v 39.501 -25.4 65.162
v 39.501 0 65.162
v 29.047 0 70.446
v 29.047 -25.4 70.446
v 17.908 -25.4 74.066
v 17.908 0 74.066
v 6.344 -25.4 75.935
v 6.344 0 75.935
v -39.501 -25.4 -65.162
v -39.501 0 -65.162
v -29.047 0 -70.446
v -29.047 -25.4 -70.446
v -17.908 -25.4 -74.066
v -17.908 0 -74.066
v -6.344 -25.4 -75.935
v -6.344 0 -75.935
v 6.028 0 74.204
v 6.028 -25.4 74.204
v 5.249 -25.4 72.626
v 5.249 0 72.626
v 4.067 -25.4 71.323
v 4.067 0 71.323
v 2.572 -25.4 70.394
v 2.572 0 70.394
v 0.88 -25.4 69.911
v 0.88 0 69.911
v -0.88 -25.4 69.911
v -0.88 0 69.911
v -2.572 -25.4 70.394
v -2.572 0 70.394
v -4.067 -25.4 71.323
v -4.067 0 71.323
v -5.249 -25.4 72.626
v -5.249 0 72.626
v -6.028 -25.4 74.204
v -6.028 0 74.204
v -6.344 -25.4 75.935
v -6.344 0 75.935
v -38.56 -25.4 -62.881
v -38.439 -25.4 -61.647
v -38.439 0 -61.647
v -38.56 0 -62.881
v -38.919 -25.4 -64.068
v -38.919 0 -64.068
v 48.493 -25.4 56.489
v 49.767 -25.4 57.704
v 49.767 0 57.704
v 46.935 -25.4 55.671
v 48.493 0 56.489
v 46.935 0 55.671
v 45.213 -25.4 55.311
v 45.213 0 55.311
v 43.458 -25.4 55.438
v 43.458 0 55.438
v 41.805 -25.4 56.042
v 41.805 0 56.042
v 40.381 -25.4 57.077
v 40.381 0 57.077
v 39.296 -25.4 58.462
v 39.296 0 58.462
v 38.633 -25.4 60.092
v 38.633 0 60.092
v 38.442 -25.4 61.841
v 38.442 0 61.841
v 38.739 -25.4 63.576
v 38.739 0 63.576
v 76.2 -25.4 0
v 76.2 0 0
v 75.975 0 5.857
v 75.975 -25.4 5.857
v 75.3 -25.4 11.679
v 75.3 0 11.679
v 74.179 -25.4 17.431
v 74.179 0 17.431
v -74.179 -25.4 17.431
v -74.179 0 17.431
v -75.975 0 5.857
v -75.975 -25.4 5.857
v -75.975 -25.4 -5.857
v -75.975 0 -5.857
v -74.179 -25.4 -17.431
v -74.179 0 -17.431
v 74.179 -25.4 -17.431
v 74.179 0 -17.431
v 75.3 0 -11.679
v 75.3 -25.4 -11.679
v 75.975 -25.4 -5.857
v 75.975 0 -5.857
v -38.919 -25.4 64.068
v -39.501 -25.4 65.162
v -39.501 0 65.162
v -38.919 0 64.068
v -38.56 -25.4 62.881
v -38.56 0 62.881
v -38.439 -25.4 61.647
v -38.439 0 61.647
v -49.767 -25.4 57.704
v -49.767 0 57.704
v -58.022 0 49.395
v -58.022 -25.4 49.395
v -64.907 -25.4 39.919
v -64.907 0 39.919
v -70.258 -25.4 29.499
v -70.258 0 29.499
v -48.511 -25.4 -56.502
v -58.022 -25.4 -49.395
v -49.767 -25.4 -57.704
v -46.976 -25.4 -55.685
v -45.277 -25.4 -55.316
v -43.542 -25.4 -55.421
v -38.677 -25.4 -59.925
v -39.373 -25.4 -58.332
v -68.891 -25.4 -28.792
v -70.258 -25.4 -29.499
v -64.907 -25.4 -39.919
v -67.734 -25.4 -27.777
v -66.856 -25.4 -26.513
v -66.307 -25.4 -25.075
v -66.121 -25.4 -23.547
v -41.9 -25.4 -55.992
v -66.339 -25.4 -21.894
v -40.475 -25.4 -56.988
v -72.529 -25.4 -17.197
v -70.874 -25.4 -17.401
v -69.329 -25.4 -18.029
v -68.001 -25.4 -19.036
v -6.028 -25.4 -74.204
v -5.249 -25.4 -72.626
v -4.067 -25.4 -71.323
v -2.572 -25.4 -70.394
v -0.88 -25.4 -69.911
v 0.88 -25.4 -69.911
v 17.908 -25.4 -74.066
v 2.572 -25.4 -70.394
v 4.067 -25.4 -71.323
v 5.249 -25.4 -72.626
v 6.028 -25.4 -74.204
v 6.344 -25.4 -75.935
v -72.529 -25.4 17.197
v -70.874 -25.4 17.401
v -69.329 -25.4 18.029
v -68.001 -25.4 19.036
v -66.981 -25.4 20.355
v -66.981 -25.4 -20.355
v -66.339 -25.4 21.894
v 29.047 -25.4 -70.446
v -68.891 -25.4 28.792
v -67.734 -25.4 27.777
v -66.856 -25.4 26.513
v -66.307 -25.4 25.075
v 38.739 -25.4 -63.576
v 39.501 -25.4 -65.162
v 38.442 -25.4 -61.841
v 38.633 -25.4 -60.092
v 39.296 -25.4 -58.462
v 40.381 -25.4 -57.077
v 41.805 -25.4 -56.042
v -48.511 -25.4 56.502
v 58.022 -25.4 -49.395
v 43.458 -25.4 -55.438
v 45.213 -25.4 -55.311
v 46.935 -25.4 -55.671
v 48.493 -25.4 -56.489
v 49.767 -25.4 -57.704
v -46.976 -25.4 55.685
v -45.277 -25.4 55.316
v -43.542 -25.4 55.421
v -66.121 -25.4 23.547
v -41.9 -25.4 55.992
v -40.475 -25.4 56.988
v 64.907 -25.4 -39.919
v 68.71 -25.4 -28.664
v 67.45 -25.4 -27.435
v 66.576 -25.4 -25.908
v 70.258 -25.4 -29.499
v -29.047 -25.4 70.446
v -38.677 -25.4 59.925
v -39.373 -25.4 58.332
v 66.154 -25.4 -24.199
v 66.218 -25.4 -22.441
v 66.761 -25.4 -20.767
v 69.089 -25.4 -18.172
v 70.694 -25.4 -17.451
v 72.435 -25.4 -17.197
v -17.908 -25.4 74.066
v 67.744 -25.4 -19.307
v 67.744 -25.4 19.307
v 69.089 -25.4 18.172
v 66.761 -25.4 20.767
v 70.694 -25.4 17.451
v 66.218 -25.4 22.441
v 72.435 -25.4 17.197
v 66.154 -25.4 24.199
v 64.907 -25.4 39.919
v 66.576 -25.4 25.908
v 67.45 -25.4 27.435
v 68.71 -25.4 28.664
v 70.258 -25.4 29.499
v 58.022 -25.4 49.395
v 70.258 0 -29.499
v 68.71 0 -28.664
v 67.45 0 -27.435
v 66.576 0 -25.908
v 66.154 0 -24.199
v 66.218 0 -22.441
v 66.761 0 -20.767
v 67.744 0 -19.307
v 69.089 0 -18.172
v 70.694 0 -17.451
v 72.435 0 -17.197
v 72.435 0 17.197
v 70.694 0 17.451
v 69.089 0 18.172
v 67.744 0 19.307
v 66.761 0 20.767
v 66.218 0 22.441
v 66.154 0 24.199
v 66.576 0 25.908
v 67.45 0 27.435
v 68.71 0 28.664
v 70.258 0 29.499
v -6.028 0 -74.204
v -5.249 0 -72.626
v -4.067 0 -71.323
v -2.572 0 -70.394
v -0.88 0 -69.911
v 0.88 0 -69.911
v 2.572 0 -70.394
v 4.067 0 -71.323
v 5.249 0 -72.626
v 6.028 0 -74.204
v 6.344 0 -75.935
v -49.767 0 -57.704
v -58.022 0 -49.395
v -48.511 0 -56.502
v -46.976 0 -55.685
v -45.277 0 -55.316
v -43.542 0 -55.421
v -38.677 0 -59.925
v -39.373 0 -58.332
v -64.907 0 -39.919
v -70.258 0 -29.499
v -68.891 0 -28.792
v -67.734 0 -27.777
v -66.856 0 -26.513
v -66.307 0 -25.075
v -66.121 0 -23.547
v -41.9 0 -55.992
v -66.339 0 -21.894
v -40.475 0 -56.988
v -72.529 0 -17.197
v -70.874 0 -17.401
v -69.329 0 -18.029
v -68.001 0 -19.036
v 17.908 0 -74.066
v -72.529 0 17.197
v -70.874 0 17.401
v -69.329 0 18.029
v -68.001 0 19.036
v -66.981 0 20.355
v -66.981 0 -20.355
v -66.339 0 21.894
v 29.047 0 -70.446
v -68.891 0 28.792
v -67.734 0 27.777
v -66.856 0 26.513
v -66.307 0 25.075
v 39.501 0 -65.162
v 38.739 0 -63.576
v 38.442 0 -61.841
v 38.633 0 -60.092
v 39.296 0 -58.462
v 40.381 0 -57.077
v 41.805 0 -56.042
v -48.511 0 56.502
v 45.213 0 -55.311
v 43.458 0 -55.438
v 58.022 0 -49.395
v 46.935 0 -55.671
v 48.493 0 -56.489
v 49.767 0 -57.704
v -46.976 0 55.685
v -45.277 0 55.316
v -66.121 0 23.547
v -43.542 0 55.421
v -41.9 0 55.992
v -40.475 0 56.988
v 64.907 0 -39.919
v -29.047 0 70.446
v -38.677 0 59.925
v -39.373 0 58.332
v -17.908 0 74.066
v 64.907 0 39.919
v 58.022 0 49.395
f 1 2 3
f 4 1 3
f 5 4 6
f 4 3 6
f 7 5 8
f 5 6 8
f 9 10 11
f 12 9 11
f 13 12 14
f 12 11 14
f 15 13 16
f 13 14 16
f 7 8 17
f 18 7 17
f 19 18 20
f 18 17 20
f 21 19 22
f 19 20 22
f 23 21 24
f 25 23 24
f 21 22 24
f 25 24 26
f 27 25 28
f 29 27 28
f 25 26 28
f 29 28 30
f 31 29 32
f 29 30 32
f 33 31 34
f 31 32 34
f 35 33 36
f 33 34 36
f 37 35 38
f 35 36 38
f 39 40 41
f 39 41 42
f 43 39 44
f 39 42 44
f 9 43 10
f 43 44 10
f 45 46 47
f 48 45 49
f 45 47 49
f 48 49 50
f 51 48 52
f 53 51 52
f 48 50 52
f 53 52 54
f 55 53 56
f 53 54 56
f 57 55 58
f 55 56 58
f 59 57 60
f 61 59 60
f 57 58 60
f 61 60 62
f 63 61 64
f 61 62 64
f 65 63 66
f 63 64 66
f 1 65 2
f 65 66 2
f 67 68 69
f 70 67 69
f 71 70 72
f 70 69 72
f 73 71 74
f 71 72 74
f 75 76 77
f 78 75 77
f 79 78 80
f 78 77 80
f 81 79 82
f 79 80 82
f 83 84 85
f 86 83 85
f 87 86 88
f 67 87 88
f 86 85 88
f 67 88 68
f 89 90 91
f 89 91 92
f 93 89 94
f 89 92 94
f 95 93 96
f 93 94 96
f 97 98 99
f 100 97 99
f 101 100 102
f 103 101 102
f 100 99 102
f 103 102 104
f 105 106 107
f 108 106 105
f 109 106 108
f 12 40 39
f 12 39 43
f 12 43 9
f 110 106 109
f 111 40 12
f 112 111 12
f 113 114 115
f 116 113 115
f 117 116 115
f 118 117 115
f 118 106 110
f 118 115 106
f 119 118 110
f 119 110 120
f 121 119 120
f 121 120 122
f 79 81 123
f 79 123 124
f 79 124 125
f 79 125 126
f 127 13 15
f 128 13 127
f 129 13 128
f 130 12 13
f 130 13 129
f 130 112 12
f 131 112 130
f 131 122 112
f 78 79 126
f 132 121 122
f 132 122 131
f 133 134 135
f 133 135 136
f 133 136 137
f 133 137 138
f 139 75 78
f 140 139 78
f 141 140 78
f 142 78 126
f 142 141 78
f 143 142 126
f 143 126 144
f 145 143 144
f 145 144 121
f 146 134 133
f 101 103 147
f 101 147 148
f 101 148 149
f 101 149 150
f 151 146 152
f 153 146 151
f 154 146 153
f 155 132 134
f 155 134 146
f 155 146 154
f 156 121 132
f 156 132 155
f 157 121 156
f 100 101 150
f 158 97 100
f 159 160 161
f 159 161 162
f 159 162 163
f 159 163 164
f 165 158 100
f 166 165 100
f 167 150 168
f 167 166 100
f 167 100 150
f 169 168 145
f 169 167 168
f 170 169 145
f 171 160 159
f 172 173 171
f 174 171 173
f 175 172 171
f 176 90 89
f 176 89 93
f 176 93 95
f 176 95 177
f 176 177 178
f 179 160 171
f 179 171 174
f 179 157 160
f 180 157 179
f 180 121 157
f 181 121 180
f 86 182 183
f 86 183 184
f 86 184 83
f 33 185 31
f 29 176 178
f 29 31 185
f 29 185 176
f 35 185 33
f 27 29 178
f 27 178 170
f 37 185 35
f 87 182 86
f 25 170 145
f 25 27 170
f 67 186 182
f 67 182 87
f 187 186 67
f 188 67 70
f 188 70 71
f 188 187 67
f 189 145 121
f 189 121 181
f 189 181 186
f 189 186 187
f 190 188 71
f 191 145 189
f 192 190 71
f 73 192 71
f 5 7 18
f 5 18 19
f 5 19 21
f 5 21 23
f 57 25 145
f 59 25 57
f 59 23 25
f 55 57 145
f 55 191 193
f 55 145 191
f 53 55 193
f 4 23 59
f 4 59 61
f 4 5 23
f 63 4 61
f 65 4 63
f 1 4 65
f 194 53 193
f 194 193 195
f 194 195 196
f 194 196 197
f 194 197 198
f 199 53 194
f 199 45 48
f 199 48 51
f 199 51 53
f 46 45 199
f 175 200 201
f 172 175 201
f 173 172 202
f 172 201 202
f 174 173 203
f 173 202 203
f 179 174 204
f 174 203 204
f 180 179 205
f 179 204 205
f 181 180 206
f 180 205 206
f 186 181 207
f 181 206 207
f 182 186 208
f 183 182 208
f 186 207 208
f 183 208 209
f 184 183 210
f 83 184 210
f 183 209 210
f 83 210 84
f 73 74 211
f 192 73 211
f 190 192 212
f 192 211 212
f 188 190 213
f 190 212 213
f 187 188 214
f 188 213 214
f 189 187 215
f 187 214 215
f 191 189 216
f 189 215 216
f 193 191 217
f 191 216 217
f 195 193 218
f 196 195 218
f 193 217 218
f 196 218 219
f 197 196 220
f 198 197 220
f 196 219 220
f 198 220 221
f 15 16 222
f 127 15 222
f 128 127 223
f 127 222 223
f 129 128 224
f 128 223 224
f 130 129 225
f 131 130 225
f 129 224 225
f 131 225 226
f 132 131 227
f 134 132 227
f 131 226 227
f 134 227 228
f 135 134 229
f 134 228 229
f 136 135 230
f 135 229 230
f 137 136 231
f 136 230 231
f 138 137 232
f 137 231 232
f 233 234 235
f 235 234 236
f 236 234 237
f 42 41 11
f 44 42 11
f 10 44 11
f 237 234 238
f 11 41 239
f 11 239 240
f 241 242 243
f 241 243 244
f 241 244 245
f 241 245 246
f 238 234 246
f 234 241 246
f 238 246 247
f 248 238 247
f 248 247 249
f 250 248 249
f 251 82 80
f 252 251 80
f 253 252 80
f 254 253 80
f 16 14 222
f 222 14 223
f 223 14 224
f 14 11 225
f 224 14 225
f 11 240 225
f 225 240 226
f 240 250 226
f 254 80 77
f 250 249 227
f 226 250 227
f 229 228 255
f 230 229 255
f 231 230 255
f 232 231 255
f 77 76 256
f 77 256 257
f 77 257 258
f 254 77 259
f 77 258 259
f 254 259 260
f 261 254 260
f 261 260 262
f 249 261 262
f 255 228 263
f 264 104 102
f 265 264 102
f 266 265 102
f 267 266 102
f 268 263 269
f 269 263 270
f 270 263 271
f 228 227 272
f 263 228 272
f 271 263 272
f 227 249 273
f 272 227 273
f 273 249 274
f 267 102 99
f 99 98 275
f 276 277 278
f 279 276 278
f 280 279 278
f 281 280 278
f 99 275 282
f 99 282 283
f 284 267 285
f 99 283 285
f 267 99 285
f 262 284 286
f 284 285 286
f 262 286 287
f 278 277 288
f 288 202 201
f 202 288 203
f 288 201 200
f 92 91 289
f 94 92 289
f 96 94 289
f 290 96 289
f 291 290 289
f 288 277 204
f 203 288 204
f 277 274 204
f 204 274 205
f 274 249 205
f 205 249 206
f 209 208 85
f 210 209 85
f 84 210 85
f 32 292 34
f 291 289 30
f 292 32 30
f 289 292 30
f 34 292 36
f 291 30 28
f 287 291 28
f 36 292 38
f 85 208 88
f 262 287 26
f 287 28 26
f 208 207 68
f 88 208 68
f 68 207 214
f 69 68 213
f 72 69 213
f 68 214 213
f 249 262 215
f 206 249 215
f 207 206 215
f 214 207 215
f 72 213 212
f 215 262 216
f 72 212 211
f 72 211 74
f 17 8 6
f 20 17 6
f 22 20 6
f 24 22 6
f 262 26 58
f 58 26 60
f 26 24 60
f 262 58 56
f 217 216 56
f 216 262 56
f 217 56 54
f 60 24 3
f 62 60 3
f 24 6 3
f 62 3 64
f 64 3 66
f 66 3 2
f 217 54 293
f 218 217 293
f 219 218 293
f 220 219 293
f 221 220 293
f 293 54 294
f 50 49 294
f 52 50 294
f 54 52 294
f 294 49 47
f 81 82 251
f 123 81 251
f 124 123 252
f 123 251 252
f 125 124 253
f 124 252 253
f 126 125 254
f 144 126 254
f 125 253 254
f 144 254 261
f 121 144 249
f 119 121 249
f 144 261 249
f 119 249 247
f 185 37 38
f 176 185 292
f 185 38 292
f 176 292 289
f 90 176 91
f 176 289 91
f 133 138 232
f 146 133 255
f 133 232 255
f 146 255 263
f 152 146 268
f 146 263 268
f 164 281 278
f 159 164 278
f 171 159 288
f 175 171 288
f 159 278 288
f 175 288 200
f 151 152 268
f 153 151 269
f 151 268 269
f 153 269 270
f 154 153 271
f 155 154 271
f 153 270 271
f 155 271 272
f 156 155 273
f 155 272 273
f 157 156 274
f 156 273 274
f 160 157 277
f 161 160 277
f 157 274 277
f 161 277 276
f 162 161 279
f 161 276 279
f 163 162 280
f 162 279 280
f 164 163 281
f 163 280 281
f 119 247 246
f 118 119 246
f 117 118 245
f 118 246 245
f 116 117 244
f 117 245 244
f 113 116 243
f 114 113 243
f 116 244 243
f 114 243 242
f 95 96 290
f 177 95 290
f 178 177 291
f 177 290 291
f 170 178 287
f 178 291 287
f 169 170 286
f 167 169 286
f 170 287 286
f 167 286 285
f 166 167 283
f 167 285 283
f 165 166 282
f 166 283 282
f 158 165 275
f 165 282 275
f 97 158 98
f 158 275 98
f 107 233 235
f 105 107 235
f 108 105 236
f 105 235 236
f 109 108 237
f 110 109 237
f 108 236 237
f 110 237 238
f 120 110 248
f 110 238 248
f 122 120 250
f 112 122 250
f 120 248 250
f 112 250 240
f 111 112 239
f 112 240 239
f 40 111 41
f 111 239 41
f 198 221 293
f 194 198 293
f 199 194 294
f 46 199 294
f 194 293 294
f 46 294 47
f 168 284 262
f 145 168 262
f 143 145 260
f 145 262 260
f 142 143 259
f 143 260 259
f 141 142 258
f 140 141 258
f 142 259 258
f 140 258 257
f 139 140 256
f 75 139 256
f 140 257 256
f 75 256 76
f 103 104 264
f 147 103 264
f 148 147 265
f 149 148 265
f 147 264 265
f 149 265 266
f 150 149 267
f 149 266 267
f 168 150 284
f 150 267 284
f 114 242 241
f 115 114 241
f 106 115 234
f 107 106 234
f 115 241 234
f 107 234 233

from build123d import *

# Parameters (mm, degrees)
F1_DEPTH = 25.4


with BuildPart() as f1:
    # F0 (on Front) → F1 (new body)
    with BuildSketch(Plane.XZ):
        with BuildLine():
            ThreePointArc((74.179427, -17.43137), (75.693171, -8.774044), (76.2, 0))
            ThreePointArc((76.2, 0), (75.693171, 8.774044), (74.179427, 17.43137))
            ThreePointArc((74.179427, 17.43137), (66.431298, 21.584837), (70.258319, 29.499298))
            ThreePointArc((70.258319, 29.499298), (61.647095, 44.789236), (49.766515, 57.703848))
            ThreePointArc((49.766515, 57.703848), (41.0568, 56.509837), (39.500921, 65.162238))
            ThreePointArc((39.500921, 65.162238), (23.547095, 72.470507), (6.344485, 75.935417))
            ThreePointArc((6.344485, 75.935417), (0, 69.85), (-6.344485, 75.935417))
            ThreePointArc((-6.344485, 75.935417), (-23.547095, 72.470507), (-39.500921, 65.162238))
            ThreePointArc((-39.500921, 65.162238), (-38.710449, 63.483083), (-38.439236, 61.647095))
            ThreePointArc((-38.439236, 61.647095), (-42.70156, 55.650087), (-49.766515, 57.703848))
            ThreePointArc((-49.766515, 57.703848), (-61.647095, 44.789236), (-70.258319, 29.499298))
            ThreePointArc((-70.258319, 29.499298), (-67.256588, 27.171671), (-66.120507, 23.547095))
            ThreePointArc((-66.120507, 23.547095), (-68.631831, 18.488728), (-74.179427, 17.43137))
            ThreePointArc((-74.179427, 17.43137), (-76.2, 0), (-74.179427, -17.43137))
            ThreePointArc((-74.179427, -17.43137), (-68.631831, -18.488728), (-66.120507, -23.547095))
            ThreePointArc((-66.120507, -23.547095), (-67.256588, -27.171671), (-70.258319, -29.499298))
            ThreePointArc((-70.258319, -29.499298), (-61.647095, -44.789236), (-49.766515, -57.703848))
            ThreePointArc((-49.766515, -57.703848), (-42.70156, -55.650087), (-38.439236, -61.647095))
            ThreePointArc((-38.439236, -61.647095), (-38.710449, -63.483083), (-39.500921, -65.162238))
            ThreePointArc((-39.500921, -65.162238), (-23.547095, -72.470507), (-6.344485, -75.935417))
            ThreePointArc((-6.344485, -75.935417), (0, -69.85), (6.344485, -75.935417))
            ThreePointArc((6.344485, -75.935417), (23.547095, -72.470507), (39.500921, -65.162238))
            ThreePointArc((39.500921, -65.162238), (41.0568, -56.509837), (49.766515, -57.703848))
            ThreePointArc((49.766515, -57.703848), (61.647095, -44.789236), (70.258319, -29.499298))
            ThreePointArc((70.258319, -29.499298), (66.431298, -21.584837), (74.179427, -17.43137))
        make_face()
    extrude(amount=F1_DEPTH)


solid = f1.part
